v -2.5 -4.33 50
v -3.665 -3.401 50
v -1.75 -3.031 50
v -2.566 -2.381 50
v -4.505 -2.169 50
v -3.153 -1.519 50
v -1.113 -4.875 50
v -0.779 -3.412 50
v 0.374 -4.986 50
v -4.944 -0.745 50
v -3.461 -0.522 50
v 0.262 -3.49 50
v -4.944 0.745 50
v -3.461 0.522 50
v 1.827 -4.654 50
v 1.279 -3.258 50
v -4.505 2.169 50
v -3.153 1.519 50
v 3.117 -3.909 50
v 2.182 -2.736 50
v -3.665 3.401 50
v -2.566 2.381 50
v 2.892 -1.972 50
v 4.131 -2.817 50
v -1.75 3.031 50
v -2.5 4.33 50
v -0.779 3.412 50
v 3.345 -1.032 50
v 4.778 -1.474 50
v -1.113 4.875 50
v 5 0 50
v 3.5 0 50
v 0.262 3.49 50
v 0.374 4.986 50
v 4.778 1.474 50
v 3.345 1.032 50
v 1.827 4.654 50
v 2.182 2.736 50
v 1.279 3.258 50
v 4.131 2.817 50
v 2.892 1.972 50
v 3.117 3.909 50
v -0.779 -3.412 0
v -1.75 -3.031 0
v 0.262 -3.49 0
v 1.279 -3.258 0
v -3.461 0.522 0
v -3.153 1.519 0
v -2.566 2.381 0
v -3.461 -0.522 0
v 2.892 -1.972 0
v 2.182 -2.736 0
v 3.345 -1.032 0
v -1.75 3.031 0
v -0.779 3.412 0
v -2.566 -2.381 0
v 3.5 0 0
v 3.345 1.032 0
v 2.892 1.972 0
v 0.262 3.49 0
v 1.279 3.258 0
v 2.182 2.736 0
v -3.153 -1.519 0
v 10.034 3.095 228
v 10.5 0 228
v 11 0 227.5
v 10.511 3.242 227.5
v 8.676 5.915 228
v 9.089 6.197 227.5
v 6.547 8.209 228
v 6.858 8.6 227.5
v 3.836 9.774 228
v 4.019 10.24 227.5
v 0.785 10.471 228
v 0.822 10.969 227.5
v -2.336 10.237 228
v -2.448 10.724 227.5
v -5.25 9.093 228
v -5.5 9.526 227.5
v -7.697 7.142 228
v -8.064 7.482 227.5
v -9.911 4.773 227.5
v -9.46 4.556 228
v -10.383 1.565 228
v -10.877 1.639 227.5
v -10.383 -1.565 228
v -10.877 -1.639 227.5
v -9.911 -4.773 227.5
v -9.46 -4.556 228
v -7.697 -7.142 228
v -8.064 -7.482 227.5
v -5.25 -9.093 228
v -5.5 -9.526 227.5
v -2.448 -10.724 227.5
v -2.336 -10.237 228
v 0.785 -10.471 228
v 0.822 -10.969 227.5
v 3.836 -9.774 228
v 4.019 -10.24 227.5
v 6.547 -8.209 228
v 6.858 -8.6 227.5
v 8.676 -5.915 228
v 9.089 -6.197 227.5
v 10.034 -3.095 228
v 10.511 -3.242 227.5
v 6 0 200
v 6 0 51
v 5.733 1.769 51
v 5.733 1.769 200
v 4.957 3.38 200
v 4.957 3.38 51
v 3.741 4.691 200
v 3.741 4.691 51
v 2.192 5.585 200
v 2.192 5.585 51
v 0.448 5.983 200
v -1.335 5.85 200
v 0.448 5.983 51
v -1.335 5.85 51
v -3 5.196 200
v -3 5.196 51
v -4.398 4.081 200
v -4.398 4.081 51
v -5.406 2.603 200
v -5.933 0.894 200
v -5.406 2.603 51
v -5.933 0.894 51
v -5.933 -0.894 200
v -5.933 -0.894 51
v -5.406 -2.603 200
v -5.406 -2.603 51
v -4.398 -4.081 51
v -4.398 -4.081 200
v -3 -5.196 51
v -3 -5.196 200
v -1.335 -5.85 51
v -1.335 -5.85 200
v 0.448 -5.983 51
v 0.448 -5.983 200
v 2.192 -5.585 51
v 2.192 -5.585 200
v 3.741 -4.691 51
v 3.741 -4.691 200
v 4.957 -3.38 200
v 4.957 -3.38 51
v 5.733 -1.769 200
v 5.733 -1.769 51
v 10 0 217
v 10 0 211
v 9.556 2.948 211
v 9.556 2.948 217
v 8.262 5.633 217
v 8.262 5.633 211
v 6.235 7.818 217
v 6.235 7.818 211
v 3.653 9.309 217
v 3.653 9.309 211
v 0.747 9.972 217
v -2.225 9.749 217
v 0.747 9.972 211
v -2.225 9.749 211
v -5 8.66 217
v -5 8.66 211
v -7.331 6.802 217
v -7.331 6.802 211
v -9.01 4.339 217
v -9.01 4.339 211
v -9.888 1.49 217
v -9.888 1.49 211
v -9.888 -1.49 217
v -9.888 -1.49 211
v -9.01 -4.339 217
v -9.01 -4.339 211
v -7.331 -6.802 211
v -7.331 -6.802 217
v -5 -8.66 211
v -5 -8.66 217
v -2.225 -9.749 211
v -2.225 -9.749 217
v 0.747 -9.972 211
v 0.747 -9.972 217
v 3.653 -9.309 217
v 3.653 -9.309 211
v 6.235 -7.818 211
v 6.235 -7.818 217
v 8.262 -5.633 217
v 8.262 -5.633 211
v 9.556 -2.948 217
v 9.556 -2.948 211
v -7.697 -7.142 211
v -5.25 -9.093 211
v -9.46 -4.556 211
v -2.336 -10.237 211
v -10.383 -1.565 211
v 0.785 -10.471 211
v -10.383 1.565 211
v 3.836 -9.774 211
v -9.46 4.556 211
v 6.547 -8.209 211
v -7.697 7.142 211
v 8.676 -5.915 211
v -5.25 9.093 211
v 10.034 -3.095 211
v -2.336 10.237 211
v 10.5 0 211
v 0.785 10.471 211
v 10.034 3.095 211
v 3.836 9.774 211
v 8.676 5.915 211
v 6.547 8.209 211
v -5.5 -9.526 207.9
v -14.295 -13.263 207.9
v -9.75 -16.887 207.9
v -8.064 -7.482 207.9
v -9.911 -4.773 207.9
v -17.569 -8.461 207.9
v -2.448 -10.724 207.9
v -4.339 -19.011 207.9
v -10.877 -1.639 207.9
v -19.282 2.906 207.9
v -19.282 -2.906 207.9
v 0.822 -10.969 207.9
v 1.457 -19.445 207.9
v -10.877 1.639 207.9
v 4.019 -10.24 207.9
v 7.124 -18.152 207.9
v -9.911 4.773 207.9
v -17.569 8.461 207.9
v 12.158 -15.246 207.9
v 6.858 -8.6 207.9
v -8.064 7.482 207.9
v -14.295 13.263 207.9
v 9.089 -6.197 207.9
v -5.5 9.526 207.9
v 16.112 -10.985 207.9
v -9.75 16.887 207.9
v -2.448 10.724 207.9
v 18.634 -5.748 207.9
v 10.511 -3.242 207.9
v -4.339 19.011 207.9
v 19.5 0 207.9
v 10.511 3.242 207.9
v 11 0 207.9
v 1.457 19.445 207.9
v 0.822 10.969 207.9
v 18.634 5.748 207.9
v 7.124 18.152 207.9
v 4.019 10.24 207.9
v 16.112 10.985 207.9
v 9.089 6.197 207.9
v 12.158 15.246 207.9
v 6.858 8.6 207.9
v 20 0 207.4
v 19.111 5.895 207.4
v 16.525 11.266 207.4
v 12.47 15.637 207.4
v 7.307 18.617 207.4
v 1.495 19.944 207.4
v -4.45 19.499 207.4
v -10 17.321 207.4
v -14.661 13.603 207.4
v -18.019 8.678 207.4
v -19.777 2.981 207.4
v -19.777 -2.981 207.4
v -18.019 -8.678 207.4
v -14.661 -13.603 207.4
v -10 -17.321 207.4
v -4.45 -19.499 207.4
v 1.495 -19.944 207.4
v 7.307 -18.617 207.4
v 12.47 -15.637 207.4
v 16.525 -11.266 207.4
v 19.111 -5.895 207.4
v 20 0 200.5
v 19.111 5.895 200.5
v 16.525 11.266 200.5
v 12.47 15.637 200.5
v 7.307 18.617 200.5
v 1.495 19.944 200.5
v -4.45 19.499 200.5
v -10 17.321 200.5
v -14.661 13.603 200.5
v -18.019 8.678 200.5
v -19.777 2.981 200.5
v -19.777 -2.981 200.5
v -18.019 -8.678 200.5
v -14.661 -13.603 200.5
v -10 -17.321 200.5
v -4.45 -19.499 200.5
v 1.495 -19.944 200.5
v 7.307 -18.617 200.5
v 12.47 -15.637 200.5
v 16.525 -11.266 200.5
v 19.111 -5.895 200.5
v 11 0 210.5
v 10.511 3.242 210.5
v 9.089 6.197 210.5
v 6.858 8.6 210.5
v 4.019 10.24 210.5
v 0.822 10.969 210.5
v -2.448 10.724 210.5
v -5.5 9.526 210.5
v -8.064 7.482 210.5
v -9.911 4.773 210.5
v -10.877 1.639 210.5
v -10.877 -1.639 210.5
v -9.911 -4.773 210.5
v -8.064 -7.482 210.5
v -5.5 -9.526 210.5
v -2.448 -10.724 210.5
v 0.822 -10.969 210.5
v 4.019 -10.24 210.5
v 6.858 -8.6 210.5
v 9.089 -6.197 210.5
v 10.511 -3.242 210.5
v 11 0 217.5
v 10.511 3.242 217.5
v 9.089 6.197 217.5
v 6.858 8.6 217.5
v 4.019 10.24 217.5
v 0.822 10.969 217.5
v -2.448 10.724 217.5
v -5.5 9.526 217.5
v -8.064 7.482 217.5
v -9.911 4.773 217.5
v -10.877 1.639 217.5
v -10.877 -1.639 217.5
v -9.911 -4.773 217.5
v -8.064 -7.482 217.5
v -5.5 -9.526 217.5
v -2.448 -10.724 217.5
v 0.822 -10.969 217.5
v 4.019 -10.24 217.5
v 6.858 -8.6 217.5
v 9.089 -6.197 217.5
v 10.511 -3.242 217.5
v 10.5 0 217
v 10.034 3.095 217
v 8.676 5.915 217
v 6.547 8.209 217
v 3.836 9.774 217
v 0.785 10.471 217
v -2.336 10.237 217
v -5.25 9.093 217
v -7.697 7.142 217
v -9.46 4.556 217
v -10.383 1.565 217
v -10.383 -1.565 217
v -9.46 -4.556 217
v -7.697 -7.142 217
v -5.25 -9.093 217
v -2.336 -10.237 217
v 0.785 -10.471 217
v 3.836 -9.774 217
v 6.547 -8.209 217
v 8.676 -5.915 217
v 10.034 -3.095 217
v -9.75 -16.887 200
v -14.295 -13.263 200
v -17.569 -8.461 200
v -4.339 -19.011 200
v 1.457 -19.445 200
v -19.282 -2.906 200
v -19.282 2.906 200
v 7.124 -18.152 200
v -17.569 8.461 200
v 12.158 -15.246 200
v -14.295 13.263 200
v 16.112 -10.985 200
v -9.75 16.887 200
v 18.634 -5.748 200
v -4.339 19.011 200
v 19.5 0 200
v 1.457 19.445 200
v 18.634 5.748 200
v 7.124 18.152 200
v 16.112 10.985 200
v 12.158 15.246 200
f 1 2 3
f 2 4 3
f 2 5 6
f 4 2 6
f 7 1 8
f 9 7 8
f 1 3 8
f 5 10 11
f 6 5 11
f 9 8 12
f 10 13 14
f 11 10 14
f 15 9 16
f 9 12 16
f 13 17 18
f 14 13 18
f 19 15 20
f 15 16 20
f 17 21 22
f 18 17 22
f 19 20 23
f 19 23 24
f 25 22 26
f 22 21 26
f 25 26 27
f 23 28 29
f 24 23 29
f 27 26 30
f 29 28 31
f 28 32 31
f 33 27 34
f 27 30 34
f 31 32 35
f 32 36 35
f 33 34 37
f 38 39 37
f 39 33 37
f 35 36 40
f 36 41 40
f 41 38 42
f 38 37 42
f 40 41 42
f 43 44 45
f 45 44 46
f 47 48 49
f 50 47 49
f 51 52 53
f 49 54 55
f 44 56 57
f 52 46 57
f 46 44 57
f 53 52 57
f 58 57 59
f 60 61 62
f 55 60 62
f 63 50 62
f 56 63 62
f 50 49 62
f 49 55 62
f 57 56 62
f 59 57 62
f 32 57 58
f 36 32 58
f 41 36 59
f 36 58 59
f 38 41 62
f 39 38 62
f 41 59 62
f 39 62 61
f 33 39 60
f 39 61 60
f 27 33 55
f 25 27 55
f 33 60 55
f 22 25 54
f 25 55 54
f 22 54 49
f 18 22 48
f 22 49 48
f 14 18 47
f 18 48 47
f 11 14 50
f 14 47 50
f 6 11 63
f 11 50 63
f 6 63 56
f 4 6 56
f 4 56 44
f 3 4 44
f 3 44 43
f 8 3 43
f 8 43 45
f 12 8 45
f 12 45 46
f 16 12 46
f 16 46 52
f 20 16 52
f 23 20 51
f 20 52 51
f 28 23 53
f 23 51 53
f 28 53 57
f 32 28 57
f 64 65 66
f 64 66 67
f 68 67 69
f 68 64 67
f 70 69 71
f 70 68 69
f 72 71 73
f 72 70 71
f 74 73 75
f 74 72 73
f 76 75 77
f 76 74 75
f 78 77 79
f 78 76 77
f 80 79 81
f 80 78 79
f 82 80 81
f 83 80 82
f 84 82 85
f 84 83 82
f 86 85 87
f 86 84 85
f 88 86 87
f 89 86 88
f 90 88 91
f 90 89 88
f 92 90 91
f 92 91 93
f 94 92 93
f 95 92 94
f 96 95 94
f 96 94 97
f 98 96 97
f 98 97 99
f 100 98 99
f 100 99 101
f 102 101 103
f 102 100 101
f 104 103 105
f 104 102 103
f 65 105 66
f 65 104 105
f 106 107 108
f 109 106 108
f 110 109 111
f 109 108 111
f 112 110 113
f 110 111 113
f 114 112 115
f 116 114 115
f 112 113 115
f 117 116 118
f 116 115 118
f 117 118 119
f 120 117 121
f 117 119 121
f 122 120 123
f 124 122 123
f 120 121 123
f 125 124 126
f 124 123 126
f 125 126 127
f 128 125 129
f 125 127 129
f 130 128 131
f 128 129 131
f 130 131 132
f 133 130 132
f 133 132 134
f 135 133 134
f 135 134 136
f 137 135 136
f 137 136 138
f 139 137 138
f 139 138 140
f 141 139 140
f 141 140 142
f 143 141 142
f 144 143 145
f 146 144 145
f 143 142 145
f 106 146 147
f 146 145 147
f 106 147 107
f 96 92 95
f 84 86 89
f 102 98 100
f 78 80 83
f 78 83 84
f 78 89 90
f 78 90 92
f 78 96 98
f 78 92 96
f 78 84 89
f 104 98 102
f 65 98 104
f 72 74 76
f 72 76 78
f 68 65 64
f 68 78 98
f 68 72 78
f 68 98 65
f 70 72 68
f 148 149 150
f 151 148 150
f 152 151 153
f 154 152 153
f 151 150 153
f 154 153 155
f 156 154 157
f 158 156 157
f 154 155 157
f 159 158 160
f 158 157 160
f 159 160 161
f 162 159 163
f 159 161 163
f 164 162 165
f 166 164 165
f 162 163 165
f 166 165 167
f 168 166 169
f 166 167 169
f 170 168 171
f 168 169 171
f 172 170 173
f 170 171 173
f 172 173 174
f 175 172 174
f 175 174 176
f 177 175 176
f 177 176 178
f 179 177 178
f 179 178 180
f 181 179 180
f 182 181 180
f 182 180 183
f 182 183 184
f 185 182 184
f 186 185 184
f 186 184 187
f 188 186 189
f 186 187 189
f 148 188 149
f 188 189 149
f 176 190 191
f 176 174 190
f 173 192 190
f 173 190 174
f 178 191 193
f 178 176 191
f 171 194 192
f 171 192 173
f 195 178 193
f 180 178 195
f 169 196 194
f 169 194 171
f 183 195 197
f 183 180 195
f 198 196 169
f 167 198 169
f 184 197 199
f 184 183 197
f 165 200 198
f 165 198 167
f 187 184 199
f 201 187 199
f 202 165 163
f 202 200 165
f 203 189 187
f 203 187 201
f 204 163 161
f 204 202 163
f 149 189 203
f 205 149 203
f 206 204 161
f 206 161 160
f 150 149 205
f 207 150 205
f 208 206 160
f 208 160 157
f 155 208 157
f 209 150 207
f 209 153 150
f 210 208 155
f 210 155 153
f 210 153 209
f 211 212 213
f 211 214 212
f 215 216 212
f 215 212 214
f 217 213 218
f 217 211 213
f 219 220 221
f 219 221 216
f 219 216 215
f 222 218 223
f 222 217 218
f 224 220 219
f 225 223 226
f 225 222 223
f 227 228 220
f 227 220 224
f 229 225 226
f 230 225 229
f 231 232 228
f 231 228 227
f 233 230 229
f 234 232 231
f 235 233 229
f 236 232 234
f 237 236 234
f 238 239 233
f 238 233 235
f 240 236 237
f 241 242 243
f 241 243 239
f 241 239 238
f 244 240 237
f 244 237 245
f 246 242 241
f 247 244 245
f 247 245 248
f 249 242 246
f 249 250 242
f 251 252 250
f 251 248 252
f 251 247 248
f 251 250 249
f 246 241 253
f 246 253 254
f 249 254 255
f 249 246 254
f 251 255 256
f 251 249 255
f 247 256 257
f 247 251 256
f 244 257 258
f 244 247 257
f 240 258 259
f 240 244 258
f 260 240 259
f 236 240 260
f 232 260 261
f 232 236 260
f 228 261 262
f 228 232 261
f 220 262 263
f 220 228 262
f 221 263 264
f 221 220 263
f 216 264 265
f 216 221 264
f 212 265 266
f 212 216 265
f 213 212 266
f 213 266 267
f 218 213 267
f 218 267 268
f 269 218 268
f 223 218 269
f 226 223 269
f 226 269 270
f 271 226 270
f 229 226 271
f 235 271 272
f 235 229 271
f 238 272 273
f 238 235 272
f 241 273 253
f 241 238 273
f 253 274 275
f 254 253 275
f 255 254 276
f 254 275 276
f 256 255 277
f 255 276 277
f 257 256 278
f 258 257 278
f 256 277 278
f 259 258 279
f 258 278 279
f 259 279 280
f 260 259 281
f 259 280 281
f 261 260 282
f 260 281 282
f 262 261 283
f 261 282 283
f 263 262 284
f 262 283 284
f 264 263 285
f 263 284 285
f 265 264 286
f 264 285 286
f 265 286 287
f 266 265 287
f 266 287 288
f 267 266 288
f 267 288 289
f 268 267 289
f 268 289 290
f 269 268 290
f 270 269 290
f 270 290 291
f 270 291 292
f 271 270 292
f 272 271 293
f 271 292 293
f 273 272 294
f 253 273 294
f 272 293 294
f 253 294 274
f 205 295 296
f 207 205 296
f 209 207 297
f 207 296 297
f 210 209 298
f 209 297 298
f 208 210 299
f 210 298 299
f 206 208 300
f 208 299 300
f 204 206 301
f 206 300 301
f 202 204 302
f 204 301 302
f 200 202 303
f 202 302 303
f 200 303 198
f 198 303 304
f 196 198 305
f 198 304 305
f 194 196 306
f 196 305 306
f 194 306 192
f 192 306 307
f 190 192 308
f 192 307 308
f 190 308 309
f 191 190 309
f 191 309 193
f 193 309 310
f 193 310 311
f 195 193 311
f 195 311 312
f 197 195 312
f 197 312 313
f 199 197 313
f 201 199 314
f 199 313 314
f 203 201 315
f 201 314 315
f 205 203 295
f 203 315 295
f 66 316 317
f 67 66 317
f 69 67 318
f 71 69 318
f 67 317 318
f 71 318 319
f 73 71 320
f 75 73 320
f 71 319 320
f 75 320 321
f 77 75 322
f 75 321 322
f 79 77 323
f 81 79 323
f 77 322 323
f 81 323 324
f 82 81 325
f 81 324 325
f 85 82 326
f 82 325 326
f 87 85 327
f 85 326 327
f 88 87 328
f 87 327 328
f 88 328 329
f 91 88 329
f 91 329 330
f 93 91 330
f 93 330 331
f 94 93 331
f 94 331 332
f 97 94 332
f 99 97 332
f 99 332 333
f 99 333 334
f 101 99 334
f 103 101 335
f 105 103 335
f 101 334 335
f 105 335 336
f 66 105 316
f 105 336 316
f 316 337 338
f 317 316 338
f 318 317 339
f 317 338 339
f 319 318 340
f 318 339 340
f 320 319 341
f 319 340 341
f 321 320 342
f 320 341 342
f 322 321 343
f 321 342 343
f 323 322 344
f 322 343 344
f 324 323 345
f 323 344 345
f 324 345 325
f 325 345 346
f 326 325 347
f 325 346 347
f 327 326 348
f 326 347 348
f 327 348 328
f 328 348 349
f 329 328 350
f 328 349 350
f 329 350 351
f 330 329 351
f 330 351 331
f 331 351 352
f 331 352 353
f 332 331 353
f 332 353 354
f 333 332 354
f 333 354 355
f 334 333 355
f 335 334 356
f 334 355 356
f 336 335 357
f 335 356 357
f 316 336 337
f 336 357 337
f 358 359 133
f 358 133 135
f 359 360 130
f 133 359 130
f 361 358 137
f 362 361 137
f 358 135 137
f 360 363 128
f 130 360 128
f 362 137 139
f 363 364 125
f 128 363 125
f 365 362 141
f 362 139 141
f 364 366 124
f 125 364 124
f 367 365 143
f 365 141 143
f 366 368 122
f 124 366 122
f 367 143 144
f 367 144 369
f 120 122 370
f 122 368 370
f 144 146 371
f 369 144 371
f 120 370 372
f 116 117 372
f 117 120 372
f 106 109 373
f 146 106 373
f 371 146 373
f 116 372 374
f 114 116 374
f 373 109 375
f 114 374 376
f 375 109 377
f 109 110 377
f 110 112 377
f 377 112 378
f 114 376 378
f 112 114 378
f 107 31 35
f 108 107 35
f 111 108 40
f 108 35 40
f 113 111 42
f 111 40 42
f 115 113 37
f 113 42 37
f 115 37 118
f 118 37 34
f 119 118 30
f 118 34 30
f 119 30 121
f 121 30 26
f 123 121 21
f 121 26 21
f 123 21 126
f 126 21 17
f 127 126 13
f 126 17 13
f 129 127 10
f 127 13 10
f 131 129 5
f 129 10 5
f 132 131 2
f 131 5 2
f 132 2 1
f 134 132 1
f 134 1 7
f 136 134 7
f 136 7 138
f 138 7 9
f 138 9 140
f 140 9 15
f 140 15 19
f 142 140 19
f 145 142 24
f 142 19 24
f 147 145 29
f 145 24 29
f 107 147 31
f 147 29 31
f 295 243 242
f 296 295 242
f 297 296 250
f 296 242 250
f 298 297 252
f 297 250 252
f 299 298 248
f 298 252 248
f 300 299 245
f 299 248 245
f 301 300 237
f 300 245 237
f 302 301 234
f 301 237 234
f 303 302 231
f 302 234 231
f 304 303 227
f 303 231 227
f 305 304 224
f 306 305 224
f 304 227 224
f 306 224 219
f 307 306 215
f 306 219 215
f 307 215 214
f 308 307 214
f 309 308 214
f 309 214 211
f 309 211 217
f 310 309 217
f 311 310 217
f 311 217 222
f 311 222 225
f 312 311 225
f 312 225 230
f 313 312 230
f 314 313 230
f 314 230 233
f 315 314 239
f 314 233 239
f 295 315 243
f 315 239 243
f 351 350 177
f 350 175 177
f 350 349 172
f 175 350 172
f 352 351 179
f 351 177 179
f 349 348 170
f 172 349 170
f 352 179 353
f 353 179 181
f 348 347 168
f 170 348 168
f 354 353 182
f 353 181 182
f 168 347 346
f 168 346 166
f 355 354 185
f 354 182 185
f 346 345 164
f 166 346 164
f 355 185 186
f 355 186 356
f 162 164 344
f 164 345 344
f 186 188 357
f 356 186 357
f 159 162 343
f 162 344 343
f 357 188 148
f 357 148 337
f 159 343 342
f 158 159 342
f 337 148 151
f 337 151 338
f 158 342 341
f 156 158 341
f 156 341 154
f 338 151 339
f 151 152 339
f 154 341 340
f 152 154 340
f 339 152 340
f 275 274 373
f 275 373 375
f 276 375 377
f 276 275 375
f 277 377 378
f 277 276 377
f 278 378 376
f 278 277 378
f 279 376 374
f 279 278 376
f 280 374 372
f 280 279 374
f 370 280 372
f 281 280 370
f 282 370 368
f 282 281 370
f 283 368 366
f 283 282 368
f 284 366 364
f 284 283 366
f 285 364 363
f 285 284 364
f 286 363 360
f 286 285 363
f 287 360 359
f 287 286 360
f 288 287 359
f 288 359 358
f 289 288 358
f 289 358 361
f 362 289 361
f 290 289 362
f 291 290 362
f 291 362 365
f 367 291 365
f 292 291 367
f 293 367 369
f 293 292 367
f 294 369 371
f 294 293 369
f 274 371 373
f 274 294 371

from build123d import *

# Parameters (mm, degrees)
F0_R      = 3.5
F1_DEPTH  = 50
F2_R      = 6
F3_DEPTH  = 150
F4_R      = 20
F5_DEPTH  = 7.9
F6_SIZE   = 1
F7_SIZE   = 0.5
F8_R      = 11
F9_DEPTH  = 3.1
F10_R     = 10
F11_DEPTH = 6
F12_R     = 11
F13_DEPTH = 11
F14_SIZE  = 0.5


with BuildPart() as f1:
    # F0 (on Top) → F1 (new body)
    with BuildSketch(Plane.XY):
        Circle(F0_R)
    extrude(amount=F1_DEPTH)

    # F2 (on face) → F3 (join)
    with BuildSketch(Plane.XY.offset(50)):
        Circle(F2_R)
    extrude(amount=F3_DEPTH)

    # F4 (on face) → F5 (join)
    with BuildSketch(Plane.XY.offset(200)):
        Circle(F4_R)
    extrude(amount=F5_DEPTH)

    # F6
    f6_edges = [f1.edges().sort_by_distance(p)[0] for p in [
        (-6, 0, 50),
    ]]
    chamfer(f6_edges, length=F6_SIZE)

    # F7
    f7_edges = [f1.edges().sort_by_distance(p)[0] for p in [
        (-20, 0, 200),
        (-20, 0, 207.9),
    ]]
    chamfer(f7_edges, length=F7_SIZE)

    # F8 (on face) → F9 (join)
    with BuildSketch(Plane.XY.offset(207.9)):
        Circle(F8_R)
    extrude(amount=F9_DEPTH)

    # F10 (on face) → F11 (join)
    with BuildSketch(Plane.XY.offset(211)):
        Circle(F10_R)
    extrude(amount=F11_DEPTH)

    # F12 (on face) → F13 (join)
    with BuildSketch(Plane.XY.offset(217)):
        Circle(F12_R)
    extrude(amount=F13_DEPTH)

    # F14
    f14_edges = [f1.edges().sort_by_distance(p)[0] for p in [
        (-11, 0, 211),
        (-11, 0, 217),
        (-11, 0, 228),
    ]]
    chamfer(f14_edges, length=F14_SIZE)


solid = f1.part
